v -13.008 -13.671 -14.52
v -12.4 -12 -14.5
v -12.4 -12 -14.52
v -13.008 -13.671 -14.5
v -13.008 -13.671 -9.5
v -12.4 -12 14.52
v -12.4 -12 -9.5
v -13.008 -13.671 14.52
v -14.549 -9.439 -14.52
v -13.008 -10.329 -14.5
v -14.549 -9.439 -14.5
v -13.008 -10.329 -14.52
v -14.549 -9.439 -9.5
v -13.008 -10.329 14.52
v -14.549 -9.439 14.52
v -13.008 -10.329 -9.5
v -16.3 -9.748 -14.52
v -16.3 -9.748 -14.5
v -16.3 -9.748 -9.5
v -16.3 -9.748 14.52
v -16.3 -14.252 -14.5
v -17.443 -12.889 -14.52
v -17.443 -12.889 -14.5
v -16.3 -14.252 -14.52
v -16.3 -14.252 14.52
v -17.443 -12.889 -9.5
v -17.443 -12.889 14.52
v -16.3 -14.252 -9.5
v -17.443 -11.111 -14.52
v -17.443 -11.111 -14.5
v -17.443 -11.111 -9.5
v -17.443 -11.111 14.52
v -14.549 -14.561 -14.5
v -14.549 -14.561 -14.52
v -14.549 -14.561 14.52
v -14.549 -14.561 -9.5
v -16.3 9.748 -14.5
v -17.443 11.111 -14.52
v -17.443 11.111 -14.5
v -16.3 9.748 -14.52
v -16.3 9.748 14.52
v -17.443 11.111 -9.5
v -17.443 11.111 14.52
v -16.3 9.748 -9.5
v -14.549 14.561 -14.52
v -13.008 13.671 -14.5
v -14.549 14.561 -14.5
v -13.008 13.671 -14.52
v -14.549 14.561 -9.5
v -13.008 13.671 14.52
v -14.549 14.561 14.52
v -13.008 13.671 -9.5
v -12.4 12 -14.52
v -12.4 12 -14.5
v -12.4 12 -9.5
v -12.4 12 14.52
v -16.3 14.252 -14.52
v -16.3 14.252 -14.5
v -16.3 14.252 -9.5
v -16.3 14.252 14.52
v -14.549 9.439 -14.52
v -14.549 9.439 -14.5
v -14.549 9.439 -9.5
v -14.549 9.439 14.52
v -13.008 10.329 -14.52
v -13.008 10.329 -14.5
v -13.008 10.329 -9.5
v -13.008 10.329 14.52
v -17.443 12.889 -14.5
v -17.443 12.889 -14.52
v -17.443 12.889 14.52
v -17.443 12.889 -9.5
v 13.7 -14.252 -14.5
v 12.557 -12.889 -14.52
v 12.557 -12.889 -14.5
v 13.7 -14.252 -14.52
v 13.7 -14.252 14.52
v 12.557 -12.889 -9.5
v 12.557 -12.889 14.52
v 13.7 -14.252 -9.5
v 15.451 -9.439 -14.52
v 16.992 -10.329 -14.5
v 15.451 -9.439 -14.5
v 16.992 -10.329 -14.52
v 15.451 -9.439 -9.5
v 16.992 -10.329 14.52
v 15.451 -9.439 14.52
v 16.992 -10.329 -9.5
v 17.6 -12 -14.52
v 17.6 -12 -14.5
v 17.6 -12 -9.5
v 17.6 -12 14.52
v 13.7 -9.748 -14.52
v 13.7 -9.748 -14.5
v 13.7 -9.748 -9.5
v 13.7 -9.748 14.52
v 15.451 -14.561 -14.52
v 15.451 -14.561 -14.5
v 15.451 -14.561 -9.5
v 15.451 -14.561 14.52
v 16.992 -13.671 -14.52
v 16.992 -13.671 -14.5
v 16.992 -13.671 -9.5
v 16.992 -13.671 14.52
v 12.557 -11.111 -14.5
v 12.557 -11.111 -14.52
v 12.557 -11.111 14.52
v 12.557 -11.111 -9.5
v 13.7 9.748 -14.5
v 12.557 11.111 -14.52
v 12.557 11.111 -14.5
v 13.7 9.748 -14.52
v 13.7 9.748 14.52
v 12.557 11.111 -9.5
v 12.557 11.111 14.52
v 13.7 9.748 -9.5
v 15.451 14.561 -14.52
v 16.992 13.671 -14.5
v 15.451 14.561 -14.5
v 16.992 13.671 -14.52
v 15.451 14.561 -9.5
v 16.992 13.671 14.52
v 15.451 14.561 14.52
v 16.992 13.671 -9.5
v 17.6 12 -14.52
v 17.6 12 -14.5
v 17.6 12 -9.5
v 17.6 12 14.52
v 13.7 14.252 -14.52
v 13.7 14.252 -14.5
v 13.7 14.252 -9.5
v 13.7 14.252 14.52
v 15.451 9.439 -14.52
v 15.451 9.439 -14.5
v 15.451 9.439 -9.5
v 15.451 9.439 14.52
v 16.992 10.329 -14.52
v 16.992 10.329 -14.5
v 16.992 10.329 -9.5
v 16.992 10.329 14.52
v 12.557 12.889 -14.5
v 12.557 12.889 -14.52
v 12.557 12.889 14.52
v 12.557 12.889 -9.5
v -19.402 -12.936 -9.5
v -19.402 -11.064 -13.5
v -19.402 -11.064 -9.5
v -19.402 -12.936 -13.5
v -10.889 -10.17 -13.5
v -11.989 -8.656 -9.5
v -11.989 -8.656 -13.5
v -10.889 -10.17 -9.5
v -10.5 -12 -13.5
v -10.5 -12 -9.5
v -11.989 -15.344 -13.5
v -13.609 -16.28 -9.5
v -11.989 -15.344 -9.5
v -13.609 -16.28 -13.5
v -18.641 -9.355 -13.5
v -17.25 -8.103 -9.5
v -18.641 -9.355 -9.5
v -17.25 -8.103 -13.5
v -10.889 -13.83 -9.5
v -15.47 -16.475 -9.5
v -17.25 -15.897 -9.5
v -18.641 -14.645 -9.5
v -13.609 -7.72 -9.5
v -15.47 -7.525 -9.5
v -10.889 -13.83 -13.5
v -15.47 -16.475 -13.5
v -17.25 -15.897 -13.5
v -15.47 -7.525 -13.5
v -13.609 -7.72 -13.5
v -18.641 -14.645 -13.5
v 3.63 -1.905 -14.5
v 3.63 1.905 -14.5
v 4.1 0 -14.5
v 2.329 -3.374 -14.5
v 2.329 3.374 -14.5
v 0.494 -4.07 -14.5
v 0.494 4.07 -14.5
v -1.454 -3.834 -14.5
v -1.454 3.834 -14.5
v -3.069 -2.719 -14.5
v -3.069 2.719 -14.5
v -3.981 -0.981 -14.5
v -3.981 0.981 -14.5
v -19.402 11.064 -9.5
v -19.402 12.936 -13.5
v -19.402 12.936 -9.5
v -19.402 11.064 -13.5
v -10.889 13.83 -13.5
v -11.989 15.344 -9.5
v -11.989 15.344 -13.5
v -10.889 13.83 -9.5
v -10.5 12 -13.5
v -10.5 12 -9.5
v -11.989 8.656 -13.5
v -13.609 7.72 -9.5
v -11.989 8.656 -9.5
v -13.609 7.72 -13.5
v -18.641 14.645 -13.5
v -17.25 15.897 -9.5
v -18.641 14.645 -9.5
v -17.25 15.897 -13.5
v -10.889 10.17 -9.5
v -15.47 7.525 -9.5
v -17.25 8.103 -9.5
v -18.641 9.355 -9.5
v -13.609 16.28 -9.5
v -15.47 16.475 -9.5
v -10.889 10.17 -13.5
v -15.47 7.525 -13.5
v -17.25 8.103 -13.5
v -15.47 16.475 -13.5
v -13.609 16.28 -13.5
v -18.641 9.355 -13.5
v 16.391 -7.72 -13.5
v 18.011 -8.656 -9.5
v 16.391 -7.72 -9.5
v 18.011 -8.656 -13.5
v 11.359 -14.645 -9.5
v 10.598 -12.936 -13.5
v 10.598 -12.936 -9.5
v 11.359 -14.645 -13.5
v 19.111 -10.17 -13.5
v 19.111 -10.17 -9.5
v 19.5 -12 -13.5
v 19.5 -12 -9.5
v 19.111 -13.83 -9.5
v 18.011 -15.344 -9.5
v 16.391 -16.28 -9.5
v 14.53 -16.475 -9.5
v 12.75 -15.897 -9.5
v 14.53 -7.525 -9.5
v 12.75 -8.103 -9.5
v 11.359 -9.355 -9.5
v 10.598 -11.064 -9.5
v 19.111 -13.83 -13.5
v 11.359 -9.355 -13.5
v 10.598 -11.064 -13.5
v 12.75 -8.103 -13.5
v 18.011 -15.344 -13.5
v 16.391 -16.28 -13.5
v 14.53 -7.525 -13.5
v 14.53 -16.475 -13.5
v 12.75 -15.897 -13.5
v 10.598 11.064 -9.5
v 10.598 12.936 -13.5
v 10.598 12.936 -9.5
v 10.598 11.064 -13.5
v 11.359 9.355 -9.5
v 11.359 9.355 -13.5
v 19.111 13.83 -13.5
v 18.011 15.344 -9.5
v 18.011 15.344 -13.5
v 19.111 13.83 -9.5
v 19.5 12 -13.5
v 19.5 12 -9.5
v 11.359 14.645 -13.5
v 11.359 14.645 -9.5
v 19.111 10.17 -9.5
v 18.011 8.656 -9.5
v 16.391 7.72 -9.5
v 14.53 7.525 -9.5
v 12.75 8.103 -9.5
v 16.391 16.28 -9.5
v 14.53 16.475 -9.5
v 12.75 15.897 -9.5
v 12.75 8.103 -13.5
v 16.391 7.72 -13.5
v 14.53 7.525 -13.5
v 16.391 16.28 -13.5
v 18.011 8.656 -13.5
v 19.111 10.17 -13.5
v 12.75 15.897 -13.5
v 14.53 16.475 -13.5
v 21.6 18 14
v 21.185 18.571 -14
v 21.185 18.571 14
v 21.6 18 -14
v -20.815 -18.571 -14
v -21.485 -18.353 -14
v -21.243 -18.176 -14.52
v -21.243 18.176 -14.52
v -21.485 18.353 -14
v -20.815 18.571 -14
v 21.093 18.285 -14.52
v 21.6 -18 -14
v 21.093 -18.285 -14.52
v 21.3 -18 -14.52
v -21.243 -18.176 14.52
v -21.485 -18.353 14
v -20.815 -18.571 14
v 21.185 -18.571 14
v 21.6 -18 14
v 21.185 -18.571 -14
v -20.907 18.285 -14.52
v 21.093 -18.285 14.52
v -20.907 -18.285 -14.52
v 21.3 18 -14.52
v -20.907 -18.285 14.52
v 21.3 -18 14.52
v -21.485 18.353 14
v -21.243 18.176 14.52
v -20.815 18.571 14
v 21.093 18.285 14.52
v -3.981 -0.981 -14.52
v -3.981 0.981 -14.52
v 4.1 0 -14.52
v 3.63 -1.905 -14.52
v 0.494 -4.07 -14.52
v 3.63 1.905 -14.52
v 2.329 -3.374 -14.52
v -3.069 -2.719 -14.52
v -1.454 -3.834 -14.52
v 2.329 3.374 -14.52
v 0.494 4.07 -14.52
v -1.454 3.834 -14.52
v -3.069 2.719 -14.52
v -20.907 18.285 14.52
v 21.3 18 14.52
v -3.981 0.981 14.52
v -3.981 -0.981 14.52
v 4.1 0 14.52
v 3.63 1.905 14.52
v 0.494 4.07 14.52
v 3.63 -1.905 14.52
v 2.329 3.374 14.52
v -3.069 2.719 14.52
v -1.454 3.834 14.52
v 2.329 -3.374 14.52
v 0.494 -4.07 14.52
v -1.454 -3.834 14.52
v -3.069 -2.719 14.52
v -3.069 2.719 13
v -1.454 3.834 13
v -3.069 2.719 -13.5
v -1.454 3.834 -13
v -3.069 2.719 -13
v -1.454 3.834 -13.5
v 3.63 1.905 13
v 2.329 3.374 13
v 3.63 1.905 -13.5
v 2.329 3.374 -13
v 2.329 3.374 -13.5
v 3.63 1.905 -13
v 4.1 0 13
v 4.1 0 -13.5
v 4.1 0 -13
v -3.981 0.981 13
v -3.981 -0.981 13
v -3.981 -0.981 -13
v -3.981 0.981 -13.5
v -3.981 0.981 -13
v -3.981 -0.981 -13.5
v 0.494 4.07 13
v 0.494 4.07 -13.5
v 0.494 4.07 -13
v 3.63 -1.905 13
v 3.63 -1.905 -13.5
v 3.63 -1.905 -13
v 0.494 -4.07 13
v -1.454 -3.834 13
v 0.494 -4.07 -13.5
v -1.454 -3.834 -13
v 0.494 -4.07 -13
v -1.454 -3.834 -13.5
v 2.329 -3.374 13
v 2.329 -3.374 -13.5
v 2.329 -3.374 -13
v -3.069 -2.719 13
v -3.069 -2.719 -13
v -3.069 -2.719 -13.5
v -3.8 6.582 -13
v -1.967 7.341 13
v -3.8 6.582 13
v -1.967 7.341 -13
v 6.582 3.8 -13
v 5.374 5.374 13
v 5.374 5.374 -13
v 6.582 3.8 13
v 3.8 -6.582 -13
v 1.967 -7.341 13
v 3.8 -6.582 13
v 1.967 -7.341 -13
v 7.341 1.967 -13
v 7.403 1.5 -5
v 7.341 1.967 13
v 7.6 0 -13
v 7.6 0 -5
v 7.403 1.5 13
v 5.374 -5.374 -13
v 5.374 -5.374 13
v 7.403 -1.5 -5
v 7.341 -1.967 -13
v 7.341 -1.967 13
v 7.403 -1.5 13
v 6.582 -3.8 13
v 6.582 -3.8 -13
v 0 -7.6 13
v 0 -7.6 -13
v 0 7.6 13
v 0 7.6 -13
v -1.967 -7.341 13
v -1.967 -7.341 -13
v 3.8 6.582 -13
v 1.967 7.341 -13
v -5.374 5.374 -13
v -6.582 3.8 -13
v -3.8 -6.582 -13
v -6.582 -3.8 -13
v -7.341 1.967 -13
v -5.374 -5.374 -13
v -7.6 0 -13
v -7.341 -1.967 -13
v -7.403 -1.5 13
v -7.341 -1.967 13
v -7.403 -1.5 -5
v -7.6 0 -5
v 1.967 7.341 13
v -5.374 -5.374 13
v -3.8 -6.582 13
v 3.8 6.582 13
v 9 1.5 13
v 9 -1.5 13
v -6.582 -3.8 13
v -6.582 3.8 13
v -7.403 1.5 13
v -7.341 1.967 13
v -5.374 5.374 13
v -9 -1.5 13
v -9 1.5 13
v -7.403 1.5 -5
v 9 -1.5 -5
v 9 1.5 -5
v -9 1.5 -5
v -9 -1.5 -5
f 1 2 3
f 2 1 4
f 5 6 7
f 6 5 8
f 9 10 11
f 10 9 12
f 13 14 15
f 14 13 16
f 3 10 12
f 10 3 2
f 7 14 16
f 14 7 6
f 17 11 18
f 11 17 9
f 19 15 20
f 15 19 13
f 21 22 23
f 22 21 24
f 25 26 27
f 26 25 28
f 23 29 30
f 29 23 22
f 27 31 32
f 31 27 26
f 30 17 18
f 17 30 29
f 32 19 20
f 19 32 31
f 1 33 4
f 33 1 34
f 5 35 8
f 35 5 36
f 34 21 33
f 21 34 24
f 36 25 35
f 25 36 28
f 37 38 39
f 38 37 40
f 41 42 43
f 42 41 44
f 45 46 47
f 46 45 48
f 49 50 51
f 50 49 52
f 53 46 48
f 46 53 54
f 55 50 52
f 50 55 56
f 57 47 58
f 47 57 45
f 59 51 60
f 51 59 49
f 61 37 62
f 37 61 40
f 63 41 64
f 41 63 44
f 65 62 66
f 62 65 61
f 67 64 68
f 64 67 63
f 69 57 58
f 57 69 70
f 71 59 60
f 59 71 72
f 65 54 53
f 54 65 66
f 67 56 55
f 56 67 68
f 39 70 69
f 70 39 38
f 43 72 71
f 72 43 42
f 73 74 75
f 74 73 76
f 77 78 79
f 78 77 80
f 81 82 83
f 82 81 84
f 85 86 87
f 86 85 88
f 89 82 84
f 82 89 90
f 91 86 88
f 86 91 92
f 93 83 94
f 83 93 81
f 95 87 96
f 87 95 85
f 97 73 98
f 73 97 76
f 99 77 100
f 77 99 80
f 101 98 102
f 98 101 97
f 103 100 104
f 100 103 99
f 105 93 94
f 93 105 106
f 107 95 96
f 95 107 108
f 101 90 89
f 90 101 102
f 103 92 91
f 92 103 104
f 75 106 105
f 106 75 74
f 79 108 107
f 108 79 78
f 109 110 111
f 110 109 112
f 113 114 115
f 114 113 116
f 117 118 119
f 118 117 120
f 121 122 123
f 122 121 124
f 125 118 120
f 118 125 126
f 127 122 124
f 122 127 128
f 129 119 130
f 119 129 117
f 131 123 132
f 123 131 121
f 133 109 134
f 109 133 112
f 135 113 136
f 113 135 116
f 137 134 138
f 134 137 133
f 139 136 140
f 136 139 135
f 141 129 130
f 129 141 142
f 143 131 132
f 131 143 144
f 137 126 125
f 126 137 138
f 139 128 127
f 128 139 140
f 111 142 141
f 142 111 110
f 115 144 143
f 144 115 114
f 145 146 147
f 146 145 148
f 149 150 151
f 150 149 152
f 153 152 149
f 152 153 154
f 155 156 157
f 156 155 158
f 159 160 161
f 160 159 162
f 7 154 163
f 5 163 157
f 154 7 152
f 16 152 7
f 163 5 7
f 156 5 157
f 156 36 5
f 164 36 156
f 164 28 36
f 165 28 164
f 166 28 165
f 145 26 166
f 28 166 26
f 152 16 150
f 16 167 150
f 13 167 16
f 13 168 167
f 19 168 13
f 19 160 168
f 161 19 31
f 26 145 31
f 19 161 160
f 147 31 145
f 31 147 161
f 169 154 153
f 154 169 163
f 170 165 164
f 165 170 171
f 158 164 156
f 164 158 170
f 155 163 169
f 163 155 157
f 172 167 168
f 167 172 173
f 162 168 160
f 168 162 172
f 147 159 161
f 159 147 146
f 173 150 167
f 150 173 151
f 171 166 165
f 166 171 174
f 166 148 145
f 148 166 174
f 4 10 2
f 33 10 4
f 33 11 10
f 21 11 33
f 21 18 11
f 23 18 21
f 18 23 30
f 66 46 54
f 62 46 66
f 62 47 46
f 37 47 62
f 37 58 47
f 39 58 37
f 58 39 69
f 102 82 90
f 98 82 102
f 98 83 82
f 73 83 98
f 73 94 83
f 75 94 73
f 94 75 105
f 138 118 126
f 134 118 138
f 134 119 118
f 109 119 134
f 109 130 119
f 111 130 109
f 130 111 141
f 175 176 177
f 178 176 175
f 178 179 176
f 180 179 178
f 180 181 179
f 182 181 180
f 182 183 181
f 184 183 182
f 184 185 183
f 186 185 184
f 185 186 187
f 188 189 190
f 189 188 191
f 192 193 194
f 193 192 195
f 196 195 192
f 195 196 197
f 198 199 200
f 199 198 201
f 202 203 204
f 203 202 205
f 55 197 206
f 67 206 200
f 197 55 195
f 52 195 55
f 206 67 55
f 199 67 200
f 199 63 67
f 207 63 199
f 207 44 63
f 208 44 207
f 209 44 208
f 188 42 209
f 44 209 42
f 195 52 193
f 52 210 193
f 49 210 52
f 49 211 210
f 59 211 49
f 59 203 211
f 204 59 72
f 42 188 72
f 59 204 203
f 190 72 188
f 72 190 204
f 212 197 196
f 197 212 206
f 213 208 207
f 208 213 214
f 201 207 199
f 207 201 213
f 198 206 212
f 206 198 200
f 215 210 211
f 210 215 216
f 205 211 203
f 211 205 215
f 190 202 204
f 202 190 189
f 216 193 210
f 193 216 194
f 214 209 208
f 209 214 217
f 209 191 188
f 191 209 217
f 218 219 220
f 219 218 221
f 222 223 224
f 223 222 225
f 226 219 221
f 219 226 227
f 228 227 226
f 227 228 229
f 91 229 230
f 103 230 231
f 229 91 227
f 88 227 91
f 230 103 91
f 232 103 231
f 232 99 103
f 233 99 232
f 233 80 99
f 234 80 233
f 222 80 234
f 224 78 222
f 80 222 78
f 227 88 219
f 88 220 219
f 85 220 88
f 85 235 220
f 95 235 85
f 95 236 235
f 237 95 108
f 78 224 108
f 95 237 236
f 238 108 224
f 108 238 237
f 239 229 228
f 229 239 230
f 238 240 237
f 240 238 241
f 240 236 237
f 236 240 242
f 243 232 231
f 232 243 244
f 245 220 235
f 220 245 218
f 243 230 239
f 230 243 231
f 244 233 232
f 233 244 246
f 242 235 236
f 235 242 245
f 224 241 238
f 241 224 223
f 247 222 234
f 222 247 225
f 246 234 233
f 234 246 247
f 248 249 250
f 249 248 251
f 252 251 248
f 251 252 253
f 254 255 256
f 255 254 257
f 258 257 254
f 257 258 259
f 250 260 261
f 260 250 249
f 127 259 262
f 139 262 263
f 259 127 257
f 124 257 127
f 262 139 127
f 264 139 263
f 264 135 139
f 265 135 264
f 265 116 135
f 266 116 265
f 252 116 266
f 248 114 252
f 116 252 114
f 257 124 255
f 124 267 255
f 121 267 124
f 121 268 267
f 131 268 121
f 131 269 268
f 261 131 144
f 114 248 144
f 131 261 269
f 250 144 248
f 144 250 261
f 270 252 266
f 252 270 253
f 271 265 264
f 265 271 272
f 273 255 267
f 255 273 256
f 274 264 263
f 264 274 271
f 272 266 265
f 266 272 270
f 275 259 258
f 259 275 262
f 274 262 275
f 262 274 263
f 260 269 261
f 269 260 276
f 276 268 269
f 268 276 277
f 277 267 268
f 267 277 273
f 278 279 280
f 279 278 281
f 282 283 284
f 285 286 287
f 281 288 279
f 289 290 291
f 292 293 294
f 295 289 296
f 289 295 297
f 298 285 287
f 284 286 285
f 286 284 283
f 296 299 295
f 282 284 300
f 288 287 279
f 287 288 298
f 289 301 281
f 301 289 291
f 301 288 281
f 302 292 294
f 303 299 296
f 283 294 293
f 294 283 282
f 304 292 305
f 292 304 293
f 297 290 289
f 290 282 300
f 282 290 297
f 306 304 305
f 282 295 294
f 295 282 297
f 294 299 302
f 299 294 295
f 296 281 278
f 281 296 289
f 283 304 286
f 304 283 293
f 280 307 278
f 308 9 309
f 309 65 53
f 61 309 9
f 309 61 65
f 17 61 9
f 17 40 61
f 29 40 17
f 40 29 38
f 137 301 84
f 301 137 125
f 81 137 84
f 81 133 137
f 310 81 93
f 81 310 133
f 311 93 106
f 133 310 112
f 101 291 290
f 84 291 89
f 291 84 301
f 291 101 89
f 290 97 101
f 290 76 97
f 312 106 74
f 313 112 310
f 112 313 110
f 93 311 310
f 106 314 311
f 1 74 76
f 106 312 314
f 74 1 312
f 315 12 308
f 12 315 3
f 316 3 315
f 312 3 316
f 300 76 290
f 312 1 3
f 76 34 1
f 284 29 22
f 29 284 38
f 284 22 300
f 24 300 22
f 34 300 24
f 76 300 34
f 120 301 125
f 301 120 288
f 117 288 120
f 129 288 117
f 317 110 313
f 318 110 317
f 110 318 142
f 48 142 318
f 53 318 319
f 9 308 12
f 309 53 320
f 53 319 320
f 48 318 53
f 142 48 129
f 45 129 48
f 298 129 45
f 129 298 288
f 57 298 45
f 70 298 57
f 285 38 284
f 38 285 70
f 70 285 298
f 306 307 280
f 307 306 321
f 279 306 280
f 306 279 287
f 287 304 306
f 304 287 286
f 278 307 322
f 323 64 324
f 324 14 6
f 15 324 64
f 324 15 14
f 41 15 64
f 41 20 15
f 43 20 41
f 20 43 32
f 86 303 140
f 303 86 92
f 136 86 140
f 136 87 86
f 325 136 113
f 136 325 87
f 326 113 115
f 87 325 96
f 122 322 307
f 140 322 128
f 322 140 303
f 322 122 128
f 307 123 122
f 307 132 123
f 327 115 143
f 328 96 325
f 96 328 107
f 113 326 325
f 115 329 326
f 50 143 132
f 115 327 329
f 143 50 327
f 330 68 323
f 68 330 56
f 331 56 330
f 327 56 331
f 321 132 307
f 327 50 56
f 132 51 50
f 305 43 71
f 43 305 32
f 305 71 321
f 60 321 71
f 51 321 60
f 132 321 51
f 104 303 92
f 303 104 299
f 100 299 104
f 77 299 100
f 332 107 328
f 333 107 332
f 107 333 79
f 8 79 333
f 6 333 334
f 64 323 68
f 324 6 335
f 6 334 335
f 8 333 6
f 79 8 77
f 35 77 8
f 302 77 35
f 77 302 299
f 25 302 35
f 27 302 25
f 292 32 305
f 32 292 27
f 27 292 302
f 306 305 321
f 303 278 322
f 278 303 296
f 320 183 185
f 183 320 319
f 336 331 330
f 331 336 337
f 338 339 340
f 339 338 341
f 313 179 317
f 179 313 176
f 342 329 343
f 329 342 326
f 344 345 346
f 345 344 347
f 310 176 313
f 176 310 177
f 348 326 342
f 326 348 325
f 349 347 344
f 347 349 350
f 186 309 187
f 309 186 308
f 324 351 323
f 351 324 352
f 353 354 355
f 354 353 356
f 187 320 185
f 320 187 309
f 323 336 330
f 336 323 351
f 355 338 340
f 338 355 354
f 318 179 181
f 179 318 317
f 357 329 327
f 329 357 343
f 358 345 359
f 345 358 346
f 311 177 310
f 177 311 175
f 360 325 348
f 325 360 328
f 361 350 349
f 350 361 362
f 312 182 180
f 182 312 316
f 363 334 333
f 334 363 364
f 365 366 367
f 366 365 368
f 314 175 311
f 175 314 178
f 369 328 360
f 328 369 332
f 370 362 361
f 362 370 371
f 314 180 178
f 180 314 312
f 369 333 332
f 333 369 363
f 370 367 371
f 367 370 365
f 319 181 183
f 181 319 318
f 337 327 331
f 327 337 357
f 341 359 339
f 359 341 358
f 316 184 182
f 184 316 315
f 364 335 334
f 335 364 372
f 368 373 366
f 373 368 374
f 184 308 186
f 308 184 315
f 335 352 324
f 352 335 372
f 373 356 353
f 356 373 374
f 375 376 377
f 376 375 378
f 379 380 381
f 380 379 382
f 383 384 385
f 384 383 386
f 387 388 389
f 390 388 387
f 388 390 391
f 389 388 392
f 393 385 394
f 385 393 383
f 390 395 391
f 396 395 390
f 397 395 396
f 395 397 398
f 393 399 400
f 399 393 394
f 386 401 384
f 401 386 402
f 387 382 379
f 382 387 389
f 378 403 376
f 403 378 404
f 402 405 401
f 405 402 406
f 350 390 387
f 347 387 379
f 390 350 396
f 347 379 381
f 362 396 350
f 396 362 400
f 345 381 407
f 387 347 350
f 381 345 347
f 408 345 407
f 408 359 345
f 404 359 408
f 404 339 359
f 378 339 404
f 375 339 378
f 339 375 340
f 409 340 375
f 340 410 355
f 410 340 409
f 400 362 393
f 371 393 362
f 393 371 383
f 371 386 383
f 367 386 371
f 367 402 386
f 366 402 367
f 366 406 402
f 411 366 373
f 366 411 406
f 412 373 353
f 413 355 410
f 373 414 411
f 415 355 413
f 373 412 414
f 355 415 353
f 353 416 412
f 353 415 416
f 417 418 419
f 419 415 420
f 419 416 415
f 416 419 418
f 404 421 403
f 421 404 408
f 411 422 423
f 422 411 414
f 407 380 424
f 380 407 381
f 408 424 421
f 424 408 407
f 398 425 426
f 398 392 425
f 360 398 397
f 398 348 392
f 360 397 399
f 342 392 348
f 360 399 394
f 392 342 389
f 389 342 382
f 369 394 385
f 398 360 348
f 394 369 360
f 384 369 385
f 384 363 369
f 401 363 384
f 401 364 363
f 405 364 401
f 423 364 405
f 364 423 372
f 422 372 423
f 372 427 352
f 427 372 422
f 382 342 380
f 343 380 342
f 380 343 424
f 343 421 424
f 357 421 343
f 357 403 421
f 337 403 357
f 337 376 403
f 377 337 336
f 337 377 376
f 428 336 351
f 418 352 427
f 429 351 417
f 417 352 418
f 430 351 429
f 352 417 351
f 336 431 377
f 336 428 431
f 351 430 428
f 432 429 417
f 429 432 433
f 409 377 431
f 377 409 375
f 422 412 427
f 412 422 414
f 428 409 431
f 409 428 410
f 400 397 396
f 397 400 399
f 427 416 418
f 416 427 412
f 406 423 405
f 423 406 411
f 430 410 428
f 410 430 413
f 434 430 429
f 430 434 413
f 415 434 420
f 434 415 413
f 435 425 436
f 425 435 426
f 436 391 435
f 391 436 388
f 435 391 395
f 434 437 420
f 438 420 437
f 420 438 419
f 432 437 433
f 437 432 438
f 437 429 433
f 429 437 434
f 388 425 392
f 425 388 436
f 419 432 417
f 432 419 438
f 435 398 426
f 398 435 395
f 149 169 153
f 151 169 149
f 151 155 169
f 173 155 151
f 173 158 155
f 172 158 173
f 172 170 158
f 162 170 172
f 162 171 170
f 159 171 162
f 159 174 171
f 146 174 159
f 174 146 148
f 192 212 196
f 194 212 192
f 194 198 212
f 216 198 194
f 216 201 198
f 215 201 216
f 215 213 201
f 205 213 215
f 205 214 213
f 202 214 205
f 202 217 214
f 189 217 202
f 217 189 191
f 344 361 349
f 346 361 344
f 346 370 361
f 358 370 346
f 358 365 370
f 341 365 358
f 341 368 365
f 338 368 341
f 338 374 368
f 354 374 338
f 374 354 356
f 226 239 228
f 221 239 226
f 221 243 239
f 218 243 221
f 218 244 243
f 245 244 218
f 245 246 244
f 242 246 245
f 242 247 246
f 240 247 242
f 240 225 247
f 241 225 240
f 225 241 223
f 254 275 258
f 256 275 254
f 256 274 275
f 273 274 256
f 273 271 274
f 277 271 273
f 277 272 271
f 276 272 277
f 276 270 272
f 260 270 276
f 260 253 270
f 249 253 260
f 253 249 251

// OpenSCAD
// Parameters
shaft_diameter = 8; //[4:16:0.1]
block_length = 42; //[21:84:0.5]
block_width = 36; //[18:72:0.5]
block_height = 28; //[14:56:0.5]
bearing_outer_diameter = 15; //[10:30:0.1]
bearing_length = 24; //[12:48:0.5]
bearing_fit_clearance = 0.2; //[0:0.6:0.05]
material_clearance = 0.2; //[0:0.6:0.05]
mount_hole_count = 4; //[2:4:1]
mount_hole_diameter = 5; //[3:8:0.1]
mount_hole_spacing_x = 30; //[15:60:0.5]
mount_hole_spacing_y = 24; //[12:48:0.5]
mount_hole_counterbore_diameter = 9; //[6:16:0.1]
mount_hole_counterbore_depth = 4; //[2:10:0.1]
clamp_slot_width = 3; //[1.5:6:0.1]
clamp_slot_height = 18; //[10:26:0.5]
clamp_slot_length = 18; //[10:30:0.5]
clamp_slot_x_offset = 0; //[-6:6:0.5]
edge_chamfer = 1.2; //[0:3:0.1]
minkowski_segments_radius = 0.6; //[0.2:1.5:0.1]
overlap = 1; //[0.5:2:0.1]

// Bearing Block Body with Chamfers
module bearing_block_body() {
  color([0.85, 0.85, 0.8]) {
    minkowski() {
      cube([block_length, block_width, block_height], center=true);
      sphere(r=minkowski_segments_radius, center=true);
    }
  }
}

// Central Bearing Bore
module central_bearing_bore() {
  cylinder(h=block_length + 2*overlap, r=(shaft_diameter/2) + material_clearance/2, center=true);
}

// Bearing Seat Bore
module bearing_seat_bore() {
  cylinder(h=bearing_length + 2*overlap, r=(bearing_outer_diameter/2) + bearing_fit_clearance/2, center=true);
}

// Clamp Slot
module clamp_slot() {
  translate([clamp_slot_x_offset, 0, (block_height/2) - (clamp_slot_height/2) - overlap])
    cube([clamp_slot_length, clamp_slot_width, clamp_slot_height], center=true);
}

// Mounting Holes
module mounting_hole_pattern() {
  union() {
    for (x = [-1, 1])
      for (y = [-1, 1])
        translate([x * mount_hole_spacing_x/2, y * mount_hole_spacing_y/2, 0])
          cylinder(h=block_height + 2*overlap, r=(mount_hole_diameter/2) + material_clearance/2, center=true);
  }
}

// Mounting Hole Counterbores
module mounting_hole_counterbore() {
  union() {
    for (x = [-1, 1])
      for (y = [-1, 1])
        translate([x * mount_hole_spacing_x/2, y * mount_hole_spacing_y/2, (-block_height/2) + (mount_hole_counterbore_depth/2)])
          cylinder(h=mount_hole_counterbore_depth + overlap, r=mount_hole_counterbore_diameter/2, center=true);
  }
}

// SCS Bearing Block
module scs_bearing_block() {
  difference() {
    bearing_block_body();
    central_bearing_bore();
    bearing_seat_bore();
    clamp_slot();
    mounting_hole_pattern();
    mounting_hole_counterbore();
  }
}

// SCS Bearing Block Assembly
module scs_bearing_block_assembly() {
  union() {
    scs_bearing_block();
    translate([0, 0, -block_height/2])
      cube([block_length, block_width, overlap], center=true);
  }
}

// Assembly
module assembly() {
  scs_bearing_block_assembly();
}

assembly();
